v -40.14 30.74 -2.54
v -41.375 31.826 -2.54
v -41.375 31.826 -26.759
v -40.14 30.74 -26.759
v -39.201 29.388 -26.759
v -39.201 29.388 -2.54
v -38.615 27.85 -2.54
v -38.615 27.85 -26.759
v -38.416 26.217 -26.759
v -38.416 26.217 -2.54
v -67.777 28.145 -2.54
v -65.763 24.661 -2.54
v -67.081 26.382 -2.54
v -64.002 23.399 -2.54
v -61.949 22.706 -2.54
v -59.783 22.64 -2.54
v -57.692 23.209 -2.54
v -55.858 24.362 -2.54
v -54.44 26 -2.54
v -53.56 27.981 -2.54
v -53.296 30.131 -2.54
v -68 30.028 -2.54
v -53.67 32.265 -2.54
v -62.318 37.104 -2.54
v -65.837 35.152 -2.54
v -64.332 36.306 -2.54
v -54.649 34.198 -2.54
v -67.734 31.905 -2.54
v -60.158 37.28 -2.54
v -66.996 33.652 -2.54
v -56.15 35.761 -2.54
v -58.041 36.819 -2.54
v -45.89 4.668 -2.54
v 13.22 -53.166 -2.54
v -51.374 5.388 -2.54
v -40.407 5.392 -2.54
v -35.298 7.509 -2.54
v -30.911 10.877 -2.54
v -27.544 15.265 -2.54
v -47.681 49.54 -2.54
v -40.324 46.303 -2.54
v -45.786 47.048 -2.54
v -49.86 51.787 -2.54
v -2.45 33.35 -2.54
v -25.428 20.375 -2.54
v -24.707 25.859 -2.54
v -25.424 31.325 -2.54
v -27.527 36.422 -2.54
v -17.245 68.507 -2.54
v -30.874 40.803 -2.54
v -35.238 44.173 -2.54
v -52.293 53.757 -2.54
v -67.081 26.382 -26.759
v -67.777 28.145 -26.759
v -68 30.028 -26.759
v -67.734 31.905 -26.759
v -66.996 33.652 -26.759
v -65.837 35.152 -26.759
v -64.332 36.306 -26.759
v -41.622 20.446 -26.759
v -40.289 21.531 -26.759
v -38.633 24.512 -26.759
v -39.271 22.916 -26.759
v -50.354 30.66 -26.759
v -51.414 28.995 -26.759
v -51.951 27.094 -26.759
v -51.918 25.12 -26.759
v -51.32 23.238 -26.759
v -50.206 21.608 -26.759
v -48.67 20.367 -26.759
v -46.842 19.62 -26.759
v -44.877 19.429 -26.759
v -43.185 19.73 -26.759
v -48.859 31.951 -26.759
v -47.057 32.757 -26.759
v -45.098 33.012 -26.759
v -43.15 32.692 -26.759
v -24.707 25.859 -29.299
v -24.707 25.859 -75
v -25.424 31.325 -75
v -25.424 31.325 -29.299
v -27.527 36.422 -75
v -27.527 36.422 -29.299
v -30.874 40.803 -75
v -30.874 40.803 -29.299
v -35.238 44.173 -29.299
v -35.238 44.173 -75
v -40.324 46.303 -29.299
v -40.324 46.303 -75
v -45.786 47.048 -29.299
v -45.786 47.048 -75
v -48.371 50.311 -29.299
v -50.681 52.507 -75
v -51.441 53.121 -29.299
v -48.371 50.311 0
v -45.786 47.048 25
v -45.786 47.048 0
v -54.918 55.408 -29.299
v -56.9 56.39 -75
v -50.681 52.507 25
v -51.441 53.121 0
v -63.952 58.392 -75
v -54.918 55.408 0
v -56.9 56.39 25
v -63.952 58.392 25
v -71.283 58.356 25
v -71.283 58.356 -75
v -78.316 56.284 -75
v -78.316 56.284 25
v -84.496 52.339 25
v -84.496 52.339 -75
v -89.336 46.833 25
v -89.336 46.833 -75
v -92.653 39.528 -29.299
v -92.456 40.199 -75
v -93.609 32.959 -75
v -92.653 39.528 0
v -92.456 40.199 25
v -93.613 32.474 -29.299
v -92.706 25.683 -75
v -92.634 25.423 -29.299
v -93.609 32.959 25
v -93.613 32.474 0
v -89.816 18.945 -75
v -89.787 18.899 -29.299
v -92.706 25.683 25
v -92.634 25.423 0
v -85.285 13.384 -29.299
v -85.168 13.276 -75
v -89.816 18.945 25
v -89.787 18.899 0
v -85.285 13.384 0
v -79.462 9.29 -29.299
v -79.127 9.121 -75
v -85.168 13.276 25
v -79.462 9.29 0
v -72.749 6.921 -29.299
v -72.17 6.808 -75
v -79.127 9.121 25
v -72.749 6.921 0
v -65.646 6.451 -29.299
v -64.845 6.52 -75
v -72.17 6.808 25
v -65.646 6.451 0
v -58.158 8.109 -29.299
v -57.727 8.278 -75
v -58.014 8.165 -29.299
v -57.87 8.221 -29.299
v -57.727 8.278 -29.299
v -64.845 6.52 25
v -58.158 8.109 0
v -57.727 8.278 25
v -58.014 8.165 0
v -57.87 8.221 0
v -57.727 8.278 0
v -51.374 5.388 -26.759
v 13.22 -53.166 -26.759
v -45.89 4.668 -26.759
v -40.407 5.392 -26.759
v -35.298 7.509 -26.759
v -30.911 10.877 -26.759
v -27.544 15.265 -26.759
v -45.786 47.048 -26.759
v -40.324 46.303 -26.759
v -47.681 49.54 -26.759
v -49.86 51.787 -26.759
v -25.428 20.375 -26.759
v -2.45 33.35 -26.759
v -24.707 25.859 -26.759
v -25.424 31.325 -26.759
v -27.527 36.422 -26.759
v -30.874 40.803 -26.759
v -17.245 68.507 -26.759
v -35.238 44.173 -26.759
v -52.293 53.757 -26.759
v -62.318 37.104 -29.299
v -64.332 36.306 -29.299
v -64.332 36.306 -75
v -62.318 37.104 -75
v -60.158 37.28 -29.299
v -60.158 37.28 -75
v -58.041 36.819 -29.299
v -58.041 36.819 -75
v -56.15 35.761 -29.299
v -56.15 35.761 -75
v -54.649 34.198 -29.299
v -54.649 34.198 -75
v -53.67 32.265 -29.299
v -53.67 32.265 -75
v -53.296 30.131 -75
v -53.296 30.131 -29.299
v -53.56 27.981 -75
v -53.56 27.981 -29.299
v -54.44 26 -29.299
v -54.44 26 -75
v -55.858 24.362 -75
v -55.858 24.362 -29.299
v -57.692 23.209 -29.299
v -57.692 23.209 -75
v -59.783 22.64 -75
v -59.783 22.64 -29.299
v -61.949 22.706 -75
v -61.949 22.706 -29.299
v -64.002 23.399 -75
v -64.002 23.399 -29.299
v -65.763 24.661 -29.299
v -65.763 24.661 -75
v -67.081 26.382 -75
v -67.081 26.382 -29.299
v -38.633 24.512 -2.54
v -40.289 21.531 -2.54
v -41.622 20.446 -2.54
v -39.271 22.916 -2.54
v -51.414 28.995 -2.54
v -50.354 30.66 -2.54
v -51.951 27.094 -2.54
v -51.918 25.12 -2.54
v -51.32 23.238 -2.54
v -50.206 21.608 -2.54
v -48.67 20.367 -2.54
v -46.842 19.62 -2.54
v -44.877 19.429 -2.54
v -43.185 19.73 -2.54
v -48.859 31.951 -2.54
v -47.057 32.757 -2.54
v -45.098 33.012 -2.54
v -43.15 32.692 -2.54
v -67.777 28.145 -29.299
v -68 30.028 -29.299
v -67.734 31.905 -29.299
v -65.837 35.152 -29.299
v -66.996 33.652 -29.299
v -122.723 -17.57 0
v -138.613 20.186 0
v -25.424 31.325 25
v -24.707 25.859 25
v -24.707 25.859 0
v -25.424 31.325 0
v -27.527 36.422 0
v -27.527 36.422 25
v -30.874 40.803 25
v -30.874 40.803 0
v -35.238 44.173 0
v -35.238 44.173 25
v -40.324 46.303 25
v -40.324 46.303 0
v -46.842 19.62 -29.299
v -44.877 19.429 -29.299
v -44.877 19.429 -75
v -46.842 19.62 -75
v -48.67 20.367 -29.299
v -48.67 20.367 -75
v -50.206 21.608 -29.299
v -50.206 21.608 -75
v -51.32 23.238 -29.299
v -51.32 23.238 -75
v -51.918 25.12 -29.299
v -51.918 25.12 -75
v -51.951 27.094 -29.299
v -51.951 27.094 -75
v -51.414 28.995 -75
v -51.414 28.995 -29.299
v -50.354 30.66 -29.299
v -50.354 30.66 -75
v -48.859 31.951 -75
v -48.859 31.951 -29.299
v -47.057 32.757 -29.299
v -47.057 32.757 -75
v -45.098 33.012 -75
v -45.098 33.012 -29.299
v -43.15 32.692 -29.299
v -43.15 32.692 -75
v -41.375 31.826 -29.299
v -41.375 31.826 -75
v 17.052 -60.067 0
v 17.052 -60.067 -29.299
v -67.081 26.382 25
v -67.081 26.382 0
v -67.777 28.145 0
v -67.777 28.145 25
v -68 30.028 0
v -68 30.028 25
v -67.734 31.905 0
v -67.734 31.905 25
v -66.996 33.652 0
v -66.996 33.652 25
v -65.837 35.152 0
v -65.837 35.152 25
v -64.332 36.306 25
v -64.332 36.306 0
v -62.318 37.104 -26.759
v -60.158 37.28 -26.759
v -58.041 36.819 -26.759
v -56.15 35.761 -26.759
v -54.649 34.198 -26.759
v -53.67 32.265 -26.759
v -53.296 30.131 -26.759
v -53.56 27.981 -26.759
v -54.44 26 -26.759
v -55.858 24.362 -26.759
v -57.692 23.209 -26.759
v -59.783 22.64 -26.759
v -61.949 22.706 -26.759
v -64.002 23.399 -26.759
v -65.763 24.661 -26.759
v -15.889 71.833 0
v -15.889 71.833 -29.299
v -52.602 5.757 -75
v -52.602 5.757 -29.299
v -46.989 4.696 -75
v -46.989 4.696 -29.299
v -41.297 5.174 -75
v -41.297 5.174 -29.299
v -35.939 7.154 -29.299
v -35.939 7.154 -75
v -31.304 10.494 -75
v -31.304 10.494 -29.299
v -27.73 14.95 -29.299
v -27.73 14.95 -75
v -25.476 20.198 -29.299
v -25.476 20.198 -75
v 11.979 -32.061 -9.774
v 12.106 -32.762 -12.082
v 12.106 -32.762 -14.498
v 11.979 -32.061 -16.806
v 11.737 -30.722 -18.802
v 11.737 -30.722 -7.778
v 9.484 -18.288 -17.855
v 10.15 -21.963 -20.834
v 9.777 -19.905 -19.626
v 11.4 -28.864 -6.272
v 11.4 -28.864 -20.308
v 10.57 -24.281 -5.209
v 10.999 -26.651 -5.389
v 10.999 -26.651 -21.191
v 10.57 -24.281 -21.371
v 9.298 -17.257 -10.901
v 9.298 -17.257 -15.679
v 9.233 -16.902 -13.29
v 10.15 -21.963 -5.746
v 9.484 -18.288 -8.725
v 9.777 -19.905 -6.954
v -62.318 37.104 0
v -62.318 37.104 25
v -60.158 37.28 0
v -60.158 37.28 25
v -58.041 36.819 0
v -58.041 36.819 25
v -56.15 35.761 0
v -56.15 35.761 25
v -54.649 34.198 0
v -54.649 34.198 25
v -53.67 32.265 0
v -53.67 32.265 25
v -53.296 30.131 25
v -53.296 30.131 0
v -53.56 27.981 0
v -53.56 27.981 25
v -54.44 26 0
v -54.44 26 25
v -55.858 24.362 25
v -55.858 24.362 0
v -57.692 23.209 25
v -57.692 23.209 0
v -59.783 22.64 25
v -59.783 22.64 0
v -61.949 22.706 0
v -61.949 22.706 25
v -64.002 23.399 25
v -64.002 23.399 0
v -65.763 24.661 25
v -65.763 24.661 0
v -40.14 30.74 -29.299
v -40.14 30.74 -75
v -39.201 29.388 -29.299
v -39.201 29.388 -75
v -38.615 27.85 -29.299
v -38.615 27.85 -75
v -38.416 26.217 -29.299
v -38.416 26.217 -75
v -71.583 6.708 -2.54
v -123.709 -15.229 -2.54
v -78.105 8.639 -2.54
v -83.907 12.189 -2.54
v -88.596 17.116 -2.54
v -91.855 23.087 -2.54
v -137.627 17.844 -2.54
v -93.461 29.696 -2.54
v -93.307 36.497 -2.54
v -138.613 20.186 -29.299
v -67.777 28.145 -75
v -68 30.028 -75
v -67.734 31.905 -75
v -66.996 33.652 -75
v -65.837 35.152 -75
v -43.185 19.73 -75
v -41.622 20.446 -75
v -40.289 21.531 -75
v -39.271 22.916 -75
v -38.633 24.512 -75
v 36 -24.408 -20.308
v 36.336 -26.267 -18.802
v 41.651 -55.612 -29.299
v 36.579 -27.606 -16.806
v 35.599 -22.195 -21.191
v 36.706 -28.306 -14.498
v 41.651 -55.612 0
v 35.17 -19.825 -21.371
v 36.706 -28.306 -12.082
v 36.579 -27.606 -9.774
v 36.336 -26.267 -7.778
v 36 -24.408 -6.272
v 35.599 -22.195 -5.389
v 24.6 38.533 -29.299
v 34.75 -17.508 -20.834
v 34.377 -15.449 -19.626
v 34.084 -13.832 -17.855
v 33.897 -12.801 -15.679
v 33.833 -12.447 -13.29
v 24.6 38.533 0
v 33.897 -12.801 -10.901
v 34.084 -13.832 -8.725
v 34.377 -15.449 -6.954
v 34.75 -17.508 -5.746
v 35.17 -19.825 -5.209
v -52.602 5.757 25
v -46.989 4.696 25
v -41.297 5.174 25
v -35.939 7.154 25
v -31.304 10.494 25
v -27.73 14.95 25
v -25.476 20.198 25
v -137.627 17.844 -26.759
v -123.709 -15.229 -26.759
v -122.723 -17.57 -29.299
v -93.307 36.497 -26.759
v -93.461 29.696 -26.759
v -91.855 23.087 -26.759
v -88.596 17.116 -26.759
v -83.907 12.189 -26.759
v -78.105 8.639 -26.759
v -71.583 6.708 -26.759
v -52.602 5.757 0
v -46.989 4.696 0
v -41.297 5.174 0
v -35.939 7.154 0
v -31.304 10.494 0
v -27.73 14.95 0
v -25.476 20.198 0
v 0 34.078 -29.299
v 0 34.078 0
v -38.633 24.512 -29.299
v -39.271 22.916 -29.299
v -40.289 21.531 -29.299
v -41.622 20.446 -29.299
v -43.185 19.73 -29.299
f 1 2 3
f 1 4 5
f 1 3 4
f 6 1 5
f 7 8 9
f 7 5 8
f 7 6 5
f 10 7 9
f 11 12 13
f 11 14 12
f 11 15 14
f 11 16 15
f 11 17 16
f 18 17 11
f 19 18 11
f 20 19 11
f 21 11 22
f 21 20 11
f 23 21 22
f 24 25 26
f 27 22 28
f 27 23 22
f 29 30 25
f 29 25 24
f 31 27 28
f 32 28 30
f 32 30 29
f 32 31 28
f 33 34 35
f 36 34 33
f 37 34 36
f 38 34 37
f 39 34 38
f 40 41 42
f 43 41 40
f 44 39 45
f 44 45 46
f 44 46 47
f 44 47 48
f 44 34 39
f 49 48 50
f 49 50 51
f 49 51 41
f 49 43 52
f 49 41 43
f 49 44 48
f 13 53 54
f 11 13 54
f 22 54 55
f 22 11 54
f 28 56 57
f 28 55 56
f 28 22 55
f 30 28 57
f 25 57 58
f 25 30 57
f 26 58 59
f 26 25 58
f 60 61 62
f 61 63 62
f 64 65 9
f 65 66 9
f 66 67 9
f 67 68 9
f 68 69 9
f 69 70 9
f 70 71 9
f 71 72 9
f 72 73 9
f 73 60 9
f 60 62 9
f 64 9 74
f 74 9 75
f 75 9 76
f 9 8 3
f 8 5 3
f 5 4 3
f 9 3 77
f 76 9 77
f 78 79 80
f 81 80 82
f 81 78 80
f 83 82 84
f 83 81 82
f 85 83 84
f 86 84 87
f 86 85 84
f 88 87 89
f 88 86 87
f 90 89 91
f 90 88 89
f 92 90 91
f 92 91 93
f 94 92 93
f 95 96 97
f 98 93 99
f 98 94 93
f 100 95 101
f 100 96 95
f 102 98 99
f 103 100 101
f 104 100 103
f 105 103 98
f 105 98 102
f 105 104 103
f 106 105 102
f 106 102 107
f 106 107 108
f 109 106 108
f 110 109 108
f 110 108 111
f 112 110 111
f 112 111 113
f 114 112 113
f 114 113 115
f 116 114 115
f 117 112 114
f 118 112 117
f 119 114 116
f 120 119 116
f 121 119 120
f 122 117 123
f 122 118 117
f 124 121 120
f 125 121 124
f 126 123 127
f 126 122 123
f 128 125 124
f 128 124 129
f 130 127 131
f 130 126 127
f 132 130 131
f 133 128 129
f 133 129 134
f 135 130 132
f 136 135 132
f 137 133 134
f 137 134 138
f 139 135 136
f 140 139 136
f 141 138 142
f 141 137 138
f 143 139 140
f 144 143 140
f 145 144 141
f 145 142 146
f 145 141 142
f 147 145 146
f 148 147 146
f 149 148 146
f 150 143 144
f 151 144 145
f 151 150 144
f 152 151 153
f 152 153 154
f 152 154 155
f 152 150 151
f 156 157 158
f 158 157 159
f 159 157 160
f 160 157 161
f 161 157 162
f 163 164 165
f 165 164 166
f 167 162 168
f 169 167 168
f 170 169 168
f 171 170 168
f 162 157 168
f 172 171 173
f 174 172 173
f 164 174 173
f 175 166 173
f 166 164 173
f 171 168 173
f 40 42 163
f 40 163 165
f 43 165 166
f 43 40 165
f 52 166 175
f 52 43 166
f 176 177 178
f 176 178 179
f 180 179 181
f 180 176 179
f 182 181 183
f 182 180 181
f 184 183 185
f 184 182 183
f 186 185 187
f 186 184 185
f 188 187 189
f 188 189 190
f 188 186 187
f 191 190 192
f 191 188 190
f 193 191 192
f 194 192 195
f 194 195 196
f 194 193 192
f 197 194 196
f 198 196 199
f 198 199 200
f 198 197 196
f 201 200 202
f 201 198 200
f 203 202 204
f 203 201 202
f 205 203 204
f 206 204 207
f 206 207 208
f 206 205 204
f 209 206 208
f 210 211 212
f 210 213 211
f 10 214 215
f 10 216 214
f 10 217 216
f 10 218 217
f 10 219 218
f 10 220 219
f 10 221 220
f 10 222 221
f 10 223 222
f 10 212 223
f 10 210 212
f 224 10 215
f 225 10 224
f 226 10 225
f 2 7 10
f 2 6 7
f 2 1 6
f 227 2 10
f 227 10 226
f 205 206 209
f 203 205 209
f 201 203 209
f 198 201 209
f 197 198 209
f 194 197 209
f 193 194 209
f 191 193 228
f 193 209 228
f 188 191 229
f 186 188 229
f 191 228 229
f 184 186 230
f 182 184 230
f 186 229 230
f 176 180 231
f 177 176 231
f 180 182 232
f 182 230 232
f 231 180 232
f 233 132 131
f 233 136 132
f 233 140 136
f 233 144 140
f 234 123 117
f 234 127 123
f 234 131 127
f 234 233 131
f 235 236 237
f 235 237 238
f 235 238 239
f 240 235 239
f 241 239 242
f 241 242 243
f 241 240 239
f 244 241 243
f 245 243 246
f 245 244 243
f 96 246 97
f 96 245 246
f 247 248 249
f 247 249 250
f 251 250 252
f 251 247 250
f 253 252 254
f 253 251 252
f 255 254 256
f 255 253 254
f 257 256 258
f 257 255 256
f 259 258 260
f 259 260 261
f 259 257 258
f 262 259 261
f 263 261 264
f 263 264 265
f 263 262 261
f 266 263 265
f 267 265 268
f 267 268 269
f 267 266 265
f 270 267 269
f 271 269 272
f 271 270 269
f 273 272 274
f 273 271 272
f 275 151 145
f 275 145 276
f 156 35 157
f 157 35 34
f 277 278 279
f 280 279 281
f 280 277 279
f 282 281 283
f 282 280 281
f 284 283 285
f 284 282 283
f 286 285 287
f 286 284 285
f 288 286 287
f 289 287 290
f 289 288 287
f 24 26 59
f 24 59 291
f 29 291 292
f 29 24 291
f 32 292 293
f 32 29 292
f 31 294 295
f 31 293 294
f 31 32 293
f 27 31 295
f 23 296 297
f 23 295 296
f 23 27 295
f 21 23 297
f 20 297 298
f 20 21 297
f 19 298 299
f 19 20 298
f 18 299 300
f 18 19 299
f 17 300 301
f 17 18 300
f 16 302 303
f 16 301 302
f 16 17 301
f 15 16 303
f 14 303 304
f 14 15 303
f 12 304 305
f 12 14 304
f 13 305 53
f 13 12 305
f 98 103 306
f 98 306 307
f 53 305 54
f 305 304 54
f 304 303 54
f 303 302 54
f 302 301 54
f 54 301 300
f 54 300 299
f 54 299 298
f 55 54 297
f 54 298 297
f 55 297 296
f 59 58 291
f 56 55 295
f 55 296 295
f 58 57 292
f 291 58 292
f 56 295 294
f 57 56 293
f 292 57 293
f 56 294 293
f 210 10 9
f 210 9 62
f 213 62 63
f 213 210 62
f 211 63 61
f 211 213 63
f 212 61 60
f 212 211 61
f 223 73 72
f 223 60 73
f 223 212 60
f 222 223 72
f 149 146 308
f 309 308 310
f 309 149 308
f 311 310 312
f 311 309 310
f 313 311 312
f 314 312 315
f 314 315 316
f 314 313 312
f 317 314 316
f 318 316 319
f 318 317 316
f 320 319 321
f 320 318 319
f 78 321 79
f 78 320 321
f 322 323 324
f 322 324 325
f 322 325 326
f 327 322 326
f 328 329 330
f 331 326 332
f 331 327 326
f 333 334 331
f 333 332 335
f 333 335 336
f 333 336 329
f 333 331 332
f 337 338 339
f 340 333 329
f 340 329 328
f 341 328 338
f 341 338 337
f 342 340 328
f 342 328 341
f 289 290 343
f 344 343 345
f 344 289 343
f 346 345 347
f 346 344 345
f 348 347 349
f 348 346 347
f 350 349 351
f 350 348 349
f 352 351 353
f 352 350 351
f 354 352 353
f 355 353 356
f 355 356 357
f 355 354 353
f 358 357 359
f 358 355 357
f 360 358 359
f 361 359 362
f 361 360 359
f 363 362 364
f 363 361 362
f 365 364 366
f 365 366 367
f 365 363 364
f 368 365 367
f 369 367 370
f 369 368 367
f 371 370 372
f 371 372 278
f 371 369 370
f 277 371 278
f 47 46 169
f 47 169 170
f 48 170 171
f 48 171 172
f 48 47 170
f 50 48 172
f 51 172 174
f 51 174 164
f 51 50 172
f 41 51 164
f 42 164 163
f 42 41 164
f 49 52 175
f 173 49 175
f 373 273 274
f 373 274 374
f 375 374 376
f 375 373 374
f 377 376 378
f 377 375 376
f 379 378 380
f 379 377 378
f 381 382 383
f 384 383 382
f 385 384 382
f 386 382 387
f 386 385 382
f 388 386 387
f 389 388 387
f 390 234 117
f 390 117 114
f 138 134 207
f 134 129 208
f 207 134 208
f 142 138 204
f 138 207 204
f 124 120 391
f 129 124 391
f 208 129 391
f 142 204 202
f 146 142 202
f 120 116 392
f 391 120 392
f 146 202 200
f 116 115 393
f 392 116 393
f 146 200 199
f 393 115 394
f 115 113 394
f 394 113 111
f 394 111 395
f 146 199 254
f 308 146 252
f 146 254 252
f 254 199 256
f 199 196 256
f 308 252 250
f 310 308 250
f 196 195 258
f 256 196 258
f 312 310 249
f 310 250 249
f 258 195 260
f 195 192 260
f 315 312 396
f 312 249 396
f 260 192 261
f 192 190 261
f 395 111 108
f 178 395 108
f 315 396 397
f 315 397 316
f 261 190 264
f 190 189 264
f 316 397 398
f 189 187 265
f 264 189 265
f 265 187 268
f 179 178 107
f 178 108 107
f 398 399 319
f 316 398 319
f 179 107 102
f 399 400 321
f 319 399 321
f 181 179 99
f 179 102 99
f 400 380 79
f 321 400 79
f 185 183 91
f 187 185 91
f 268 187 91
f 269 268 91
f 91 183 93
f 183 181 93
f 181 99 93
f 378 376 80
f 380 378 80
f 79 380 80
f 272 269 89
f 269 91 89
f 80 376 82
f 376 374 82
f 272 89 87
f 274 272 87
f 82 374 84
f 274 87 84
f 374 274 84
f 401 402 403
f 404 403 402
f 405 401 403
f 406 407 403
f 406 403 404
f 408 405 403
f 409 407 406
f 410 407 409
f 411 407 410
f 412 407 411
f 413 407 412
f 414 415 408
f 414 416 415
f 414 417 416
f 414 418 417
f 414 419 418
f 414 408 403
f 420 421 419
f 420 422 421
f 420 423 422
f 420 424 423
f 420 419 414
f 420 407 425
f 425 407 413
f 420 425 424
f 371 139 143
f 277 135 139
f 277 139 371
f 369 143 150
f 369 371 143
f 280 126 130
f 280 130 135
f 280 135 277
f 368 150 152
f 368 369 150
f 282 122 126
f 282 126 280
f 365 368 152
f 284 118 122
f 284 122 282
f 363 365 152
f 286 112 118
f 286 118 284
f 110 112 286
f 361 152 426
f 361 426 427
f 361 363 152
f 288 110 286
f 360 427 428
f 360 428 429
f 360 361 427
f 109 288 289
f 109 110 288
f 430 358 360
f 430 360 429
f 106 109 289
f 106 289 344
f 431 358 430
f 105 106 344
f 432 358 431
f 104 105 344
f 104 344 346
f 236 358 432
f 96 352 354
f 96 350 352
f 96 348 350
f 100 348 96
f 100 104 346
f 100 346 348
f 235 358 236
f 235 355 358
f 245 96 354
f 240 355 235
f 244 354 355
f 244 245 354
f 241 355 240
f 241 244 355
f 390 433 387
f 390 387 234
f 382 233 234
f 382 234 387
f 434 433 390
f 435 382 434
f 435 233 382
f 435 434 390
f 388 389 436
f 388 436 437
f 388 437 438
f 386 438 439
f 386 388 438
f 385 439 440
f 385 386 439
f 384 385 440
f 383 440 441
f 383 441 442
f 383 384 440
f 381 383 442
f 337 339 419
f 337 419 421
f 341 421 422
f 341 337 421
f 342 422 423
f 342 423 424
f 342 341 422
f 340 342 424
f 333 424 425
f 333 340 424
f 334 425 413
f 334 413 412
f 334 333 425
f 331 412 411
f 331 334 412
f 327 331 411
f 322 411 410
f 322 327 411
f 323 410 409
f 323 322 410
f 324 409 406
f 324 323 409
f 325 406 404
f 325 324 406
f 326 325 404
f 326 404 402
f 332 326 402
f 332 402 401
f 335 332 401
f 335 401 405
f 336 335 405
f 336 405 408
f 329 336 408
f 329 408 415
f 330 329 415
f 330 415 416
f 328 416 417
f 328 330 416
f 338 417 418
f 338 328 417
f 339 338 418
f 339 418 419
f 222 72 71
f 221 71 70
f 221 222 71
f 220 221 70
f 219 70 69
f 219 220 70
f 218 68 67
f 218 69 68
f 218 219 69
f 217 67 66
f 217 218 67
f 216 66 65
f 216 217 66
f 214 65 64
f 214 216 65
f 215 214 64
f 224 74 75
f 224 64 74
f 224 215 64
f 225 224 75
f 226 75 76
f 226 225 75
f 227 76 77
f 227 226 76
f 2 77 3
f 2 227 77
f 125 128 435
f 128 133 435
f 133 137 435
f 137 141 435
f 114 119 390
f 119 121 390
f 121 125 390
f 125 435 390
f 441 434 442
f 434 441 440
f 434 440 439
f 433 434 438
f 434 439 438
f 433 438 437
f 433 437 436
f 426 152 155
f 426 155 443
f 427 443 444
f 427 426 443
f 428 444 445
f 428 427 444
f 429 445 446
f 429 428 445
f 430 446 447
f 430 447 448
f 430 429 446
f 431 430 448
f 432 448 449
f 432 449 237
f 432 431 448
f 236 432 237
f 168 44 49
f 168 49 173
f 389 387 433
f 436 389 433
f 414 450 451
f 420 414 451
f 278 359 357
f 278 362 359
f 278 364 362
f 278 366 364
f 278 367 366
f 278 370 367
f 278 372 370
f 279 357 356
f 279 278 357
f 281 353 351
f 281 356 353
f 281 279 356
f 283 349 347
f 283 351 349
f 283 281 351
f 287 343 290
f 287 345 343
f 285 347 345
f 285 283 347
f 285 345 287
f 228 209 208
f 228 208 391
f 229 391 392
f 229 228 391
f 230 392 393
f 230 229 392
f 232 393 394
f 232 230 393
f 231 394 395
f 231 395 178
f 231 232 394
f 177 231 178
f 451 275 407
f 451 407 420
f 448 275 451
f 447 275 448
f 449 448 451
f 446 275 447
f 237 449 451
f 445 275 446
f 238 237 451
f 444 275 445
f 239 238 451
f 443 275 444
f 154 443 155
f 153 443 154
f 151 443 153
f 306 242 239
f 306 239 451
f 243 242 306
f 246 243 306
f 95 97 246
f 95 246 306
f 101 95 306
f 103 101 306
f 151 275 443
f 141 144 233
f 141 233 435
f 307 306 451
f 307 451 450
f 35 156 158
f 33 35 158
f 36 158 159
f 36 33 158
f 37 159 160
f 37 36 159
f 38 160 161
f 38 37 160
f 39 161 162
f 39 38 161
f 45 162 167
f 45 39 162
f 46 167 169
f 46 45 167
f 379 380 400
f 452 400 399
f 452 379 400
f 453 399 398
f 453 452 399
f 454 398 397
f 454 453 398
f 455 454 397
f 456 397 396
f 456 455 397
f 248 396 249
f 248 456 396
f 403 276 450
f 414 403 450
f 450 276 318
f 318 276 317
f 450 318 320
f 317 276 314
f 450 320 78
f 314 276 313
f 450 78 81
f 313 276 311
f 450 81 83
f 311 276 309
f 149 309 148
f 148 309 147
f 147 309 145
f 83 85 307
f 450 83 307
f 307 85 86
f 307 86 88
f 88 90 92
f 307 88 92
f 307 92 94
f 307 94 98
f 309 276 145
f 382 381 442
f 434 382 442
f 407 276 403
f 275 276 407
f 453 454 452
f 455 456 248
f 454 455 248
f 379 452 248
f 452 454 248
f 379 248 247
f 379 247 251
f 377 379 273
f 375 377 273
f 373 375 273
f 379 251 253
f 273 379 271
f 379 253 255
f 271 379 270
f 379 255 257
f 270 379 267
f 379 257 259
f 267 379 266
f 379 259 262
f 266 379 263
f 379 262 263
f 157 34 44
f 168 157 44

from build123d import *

# Parameters (mm, degrees)
F1_DEPTH  = 29.2991027236
F2_DEPTH  = 40.9627631307
F3_DEPTH  = 68.8303261995
F4_T      = -2.54
F5_W      = 95.6771153452
F5_H      = 29.2991027236
F5_R      = 8.1039957671
F6_DEPTH  = 25
F7_R      = 8.5249443269
F8_DEPTH  = 25
F10_DEPTH = 100


with BuildPart() as f1:
    # F0 (on Top) → F1 (new body)
    with BuildSketch(Plane.XY):
        Polygon((17.0515403152, -60.0674971938), (0, 34.0778976679), (-59.2823252082, 9.1290585697), align=None)
    extrude(amount=-F1_DEPTH)

    # F2 (add): a face of the model
    f2_faces = [f1.faces().sort_by_distance(p)[0] for p in [
        (-29.6411626041, 21.6034781188, -14.6495513618),
    ]]
    extrude(f2_faces, amount=F2_DEPTH)

    # F3 (add): a face of the model
    f3_faces = [f1.faces().sort_by_distance(p)[0] for p in [
        (-67.2269849041, 28.0068066647, -14.6495513618),
    ]]
    extrude(f3_faces, amount=F3_DEPTH)

    # F4
    f4_openings = [f1.faces().sort_by_distance(p)[0] for p in [
        (-130.668094, 1.307752, -14.649551),
    ]]
    offset(amount=F4_T, openings=f4_openings, kind=Kind.INTERSECTION)

    # F5 (on face) → F6 (join)
    with BuildSketch(Plane(origin=(5.9761205036, 1.0823902735, 0), x_dir=(-0.1782196323, 0.983990733, 0), z_dir=(0.983990733, 0.1782196323, 0))):
        with Locations((-14.3062221666, -14.6495513618)):
            Rectangle(F5_W, F5_H)
        with Locations((-26.3812504709, -13.2899768651)):
            Circle(F5_R, mode=Mode.SUBTRACT)
    extrude(amount=F6_DEPTH)

    # F7 (on face) → F8 (join)
    with BuildSketch(Plane.XY):
        with Locations((-45.2117063105, 26.2168720365)):
            Circle(F7_R)
    extrude(amount=F8_DEPTH)

    # F9 (on face) → F10 (join)
    with BuildSketch(Plane.XY.offset(25)):
        with BuildLine():
            ThreePointArc((-64.3323721087, 36.3062107036), (-56.9744432535, 36.3138053878), (-53.293284687, 29.9429148436))
            ThreePointArc((-53.293284687, 29.9429148436), (-58.8077923617, 22.8230389836), (-67.0805371507, 26.3817073875))
            ThreePointArc((-67.0805371507, 26.3817073875), (-64.7228255119, 16.131982496), (-57.7273939024, 8.2783463241))
            ThreePointArc((-57.7273939024, 8.2783463241), (-50.3687668703, 12.7783108002), (-44.8766799987, 19.4293298107))
            ThreePointArc((-44.8766799987, 19.4293298107), (-51.7516634602, 28.0640137679), (-41.3753042644, 31.8262384388))
            ThreePointArc((-41.3753042644, 31.8262384388), (-41.3686098103, 32.1676324461), (-41.3663781986, 32.5090847909))
            ThreePointArc((-41.3663781986, 32.5090847909), (-42.4957862059, 40.1072719094), (-45.7863536257, 47.0484660424))
            ThreePointArc((-45.7863536257, 47.0484660424), (-56.5176025345, 44.194923272), (-64.3323721087, 36.3062107036))
        make_face()
        with BuildLine():
            ThreePointArc((-67.0805371507, 26.3817073875), (-67.7337027998, 31.9053183776), (-64.3323721087, 36.3062107036))
            ThreePointArc((-64.3323721087, 36.3062107036), (-56.5176025345, 44.194923272), (-45.7863536257, 47.0484660424))
            ThreePointArc((-45.7863536257, 47.0484660424), (-92.4558918977, 40.198539381), (-57.7273939024, 8.2783463241))
            ThreePointArc((-57.7273939024, 8.2783463241), (-64.7228255119, 16.131982496), (-67.0805371507, 26.3817073875))
        make_face()
        with BuildLine():
            ThreePointArc((-24.706517752, 25.8585140109), (-30.874012332, 40.8031915547), (-45.7863536257, 47.0484660424))
            ThreePointArc((-45.7863536257, 47.0484660424), (-42.4957862059, 40.1072719094), (-41.3663781986, 32.5090847909))
            ThreePointArc((-41.3663781986, 32.5090847909), (-41.3686098103, 32.1676324461), (-41.3753042644, 31.8262384388))
            ThreePointArc((-41.3753042644, 31.8262384388), (-39.2011150693, 29.3879546634), (-38.4159008325, 26.2168720365))
            ThreePointArc((-38.4159008325, 26.2168720365), (-40.2893214342, 21.5314585835), (-44.8766799987, 19.4293298107))
            ThreePointArc((-44.8766799987, 19.4293298107), (-50.3687668703, 12.7783108002), (-57.7273939024, 8.2783463241))
            ThreePointArc((-57.7273939024, 8.2783463241), (-35.9385388446, 7.153965382), (-24.706517752, 25.8585140109))
        make_face()
    extrude(amount=-F10_DEPTH)


solid = f1.part
